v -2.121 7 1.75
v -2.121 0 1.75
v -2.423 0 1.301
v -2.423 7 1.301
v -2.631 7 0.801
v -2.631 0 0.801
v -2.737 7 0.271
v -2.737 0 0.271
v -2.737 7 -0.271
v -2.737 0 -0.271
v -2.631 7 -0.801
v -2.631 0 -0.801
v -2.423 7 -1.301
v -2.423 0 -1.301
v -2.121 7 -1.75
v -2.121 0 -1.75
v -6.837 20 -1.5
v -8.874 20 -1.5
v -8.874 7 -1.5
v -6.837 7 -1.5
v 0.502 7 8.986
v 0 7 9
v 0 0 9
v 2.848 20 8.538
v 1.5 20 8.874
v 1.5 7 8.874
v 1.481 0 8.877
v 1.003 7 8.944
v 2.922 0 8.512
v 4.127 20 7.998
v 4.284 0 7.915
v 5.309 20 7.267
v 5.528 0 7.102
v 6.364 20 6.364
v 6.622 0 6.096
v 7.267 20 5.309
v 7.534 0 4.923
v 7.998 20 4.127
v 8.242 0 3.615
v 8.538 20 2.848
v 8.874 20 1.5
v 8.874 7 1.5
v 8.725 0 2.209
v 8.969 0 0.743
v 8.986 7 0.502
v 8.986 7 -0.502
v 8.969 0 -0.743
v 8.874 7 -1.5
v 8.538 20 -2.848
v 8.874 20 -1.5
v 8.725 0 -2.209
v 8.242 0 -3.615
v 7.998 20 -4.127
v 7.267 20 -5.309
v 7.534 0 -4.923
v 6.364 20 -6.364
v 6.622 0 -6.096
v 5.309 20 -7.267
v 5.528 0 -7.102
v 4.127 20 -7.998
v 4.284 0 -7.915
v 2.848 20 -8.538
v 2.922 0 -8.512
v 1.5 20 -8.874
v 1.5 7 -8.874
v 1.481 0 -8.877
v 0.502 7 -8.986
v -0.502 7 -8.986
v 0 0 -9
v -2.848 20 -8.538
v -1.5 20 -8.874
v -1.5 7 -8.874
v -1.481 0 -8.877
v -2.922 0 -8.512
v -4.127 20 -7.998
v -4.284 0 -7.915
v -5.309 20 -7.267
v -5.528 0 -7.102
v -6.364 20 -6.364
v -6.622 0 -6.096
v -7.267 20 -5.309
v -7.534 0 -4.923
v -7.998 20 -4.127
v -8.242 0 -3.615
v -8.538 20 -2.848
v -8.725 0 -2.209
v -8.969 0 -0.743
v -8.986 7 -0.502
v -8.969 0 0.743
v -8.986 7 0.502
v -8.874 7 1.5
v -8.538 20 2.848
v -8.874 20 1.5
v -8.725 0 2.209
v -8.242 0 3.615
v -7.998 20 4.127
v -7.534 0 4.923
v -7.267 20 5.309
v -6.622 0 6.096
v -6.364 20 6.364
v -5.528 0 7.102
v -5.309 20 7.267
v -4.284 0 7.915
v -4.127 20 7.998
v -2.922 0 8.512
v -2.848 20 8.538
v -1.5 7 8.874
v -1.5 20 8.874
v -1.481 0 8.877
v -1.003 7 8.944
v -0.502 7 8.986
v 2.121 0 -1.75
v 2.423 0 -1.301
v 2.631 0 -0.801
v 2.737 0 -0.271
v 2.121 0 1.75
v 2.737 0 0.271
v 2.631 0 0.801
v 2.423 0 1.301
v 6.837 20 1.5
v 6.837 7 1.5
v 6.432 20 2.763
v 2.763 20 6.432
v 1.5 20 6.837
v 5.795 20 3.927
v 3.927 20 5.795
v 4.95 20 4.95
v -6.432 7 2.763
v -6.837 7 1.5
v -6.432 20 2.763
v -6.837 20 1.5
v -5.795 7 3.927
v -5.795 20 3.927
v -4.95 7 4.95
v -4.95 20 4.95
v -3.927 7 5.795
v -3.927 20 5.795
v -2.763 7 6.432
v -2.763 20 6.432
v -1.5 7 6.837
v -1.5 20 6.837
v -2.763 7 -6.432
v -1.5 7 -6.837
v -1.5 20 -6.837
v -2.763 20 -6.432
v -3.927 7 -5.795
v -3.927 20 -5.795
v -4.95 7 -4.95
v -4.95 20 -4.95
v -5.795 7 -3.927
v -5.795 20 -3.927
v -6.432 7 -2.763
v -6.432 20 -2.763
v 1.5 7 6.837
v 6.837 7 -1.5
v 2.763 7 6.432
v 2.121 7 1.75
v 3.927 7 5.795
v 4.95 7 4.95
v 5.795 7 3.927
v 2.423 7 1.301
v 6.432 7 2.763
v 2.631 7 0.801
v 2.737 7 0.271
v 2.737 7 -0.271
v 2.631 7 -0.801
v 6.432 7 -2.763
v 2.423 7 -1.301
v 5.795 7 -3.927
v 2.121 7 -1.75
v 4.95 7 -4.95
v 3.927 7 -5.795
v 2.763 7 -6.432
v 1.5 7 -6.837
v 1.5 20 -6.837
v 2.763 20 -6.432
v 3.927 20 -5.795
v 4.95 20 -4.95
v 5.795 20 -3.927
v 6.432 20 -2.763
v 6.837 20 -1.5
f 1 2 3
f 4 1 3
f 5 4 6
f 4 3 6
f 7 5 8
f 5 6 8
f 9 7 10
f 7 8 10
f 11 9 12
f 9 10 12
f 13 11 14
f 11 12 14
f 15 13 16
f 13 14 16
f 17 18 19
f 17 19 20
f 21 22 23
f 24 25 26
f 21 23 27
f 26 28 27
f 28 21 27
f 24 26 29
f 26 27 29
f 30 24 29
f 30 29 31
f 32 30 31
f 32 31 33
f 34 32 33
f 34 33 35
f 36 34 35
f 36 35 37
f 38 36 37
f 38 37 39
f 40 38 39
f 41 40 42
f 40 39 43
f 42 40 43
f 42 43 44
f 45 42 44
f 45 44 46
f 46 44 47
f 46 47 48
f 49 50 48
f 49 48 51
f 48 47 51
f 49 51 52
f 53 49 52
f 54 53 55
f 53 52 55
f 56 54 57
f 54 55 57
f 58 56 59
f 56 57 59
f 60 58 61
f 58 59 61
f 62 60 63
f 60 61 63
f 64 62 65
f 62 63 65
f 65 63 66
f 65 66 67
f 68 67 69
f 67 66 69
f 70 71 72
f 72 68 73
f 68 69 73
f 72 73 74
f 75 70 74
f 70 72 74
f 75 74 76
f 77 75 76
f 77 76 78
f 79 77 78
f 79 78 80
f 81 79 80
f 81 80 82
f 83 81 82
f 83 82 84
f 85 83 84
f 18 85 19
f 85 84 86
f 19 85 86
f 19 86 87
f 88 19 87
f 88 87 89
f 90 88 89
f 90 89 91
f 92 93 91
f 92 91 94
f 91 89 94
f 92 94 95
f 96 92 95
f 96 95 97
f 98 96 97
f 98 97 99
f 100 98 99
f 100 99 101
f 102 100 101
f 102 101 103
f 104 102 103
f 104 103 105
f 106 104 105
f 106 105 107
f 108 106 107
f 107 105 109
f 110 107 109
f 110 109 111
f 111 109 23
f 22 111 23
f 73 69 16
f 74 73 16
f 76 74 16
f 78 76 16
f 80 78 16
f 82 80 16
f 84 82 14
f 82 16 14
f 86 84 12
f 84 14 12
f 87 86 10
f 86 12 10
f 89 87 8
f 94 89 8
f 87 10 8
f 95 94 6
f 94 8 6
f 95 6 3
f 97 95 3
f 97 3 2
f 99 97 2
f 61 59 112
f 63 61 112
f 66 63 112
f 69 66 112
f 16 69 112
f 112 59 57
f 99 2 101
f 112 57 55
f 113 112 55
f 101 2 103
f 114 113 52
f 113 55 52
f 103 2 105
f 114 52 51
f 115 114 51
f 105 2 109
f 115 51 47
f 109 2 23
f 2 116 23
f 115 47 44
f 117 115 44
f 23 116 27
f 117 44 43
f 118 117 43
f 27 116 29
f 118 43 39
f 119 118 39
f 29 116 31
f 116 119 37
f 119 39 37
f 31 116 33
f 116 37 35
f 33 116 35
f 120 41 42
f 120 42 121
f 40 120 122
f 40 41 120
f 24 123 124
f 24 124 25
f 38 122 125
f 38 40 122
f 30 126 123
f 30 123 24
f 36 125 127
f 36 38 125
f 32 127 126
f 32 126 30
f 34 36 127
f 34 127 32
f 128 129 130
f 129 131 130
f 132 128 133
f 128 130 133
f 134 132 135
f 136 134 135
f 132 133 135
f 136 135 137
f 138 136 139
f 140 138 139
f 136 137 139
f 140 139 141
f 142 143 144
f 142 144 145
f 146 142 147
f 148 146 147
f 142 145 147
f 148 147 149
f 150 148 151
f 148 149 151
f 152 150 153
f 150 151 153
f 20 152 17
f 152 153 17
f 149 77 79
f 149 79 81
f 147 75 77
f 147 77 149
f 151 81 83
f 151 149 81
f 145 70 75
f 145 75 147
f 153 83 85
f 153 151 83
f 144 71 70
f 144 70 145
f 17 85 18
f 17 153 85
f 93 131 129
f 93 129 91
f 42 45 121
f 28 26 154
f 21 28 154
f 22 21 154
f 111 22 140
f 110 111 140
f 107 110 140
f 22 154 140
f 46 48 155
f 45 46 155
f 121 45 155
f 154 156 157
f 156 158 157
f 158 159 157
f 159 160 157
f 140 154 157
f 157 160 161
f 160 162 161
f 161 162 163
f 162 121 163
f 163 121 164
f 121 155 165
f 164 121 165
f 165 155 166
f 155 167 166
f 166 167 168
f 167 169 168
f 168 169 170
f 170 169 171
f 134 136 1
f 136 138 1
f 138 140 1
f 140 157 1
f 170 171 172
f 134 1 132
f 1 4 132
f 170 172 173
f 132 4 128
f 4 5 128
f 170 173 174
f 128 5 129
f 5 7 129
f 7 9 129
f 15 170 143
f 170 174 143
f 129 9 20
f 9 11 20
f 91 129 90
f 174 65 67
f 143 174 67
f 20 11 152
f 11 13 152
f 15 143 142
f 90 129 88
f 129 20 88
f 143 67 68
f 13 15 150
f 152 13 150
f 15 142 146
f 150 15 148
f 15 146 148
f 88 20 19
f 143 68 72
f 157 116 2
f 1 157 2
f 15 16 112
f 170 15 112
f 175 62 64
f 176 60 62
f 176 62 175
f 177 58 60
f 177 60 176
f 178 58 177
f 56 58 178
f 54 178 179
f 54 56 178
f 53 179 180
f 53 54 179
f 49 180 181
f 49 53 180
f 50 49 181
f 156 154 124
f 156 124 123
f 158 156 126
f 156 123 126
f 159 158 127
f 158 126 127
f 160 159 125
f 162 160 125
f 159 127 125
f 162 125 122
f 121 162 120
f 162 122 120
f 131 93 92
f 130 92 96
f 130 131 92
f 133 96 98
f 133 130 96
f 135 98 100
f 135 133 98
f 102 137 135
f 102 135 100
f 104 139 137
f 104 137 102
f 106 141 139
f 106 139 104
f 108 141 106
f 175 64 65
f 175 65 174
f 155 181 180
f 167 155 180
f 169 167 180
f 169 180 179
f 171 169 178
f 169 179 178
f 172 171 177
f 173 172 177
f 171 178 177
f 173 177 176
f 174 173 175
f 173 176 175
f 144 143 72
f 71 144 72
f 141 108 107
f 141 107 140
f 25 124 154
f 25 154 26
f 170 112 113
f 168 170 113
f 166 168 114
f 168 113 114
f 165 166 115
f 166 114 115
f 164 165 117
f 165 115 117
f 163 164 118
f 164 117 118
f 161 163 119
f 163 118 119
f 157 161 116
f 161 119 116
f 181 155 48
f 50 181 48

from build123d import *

# Parameters (mm, degrees)
SKETCH_1_R          = 9
EXTRUDE_1_DEPTH     = 20
CUT_EXTRUDE_1_DEPTH = 7
SKETCH_3_R          = 7
CUT_EXTRUDE_2_DEPTH = 13
CUT_EXTRUDE_3_DEPTH = 13
CUT_EXTRUDE_4_DEPTH = 13


with BuildPart() as part:
    # 草图1 → 凸台-拉伸1 (new body)
    with BuildSketch(Plane(origin=(0, 0, 0), x_dir=(1, 0, 0), z_dir=(0, 1, 0))):
        with Locations(Location((0, 0, 0), (0, 0, 270))):
            Circle(SKETCH_1_R)
    extrude(amount=EXTRUDE_1_DEPTH)

    # 草图2 → 切除-拉伸1 (cut)
    with BuildSketch(Plane(origin=(0, 0, 0), x_dir=(-1, 0, 0), z_dir=(0, -1, 0))):
        with BuildLine():
            Line((2.121320344, 1.75), (-2.121320344, 1.75))
            ThreePointArc((-2.121320344, 1.75), (-2.75, 0), (-2.121320344, -1.75))
            Line((-2.121320344, -1.75), (2.121320344, -1.75))
            ThreePointArc((2.121320344, -1.75), (2.75, 0), (2.121320344, 1.75))
        make_face()
    extrude(amount=-CUT_EXTRUDE_1_DEPTH, mode=Mode.SUBTRACT)

    # 草图3 → 切除-拉伸2 (cut)
    with BuildSketch(Plane(origin=(0, 20, 0), x_dir=(1, 0, 0), z_dir=(0, 1, 0))):
        with Locations(Location((0, 0, 0), (0, 0, 270))):
            Circle(SKETCH_3_R)
    extrude(amount=-CUT_EXTRUDE_2_DEPTH, mode=Mode.SUBTRACT)

    # 草图8 → 切除-拉伸3 (cut)
    with BuildSketch(Plane(origin=(0, 20, 0), x_dir=(1, 0, 0), z_dir=(0, 1, 0))):
        with BuildLine():
            Line((-1.5, -10.84621088), (-1.5, 10.935737737))
            ThreePointArc((-1.5, 10.935737737), (0, 12.435737737), (1.5, 10.935737737))
            Line((1.5, 10.935737737), (1.5, -10.84621088))
            ThreePointArc((1.5, -10.84621088), (0, -12.34621088), (-1.5, -10.84621088))
        make_face()
    extrude(amount=-CUT_EXTRUDE_3_DEPTH, mode=Mode.SUBTRACT)

    # 草图9 → 切除-拉伸4 (cut)
    with BuildSketch(Plane(origin=(0, 20, 0), x_dir=(1, 0, 0), z_dir=(0, 1, 0))):
        with BuildLine():
            Line((-9.142857143, 1.5), (9.171653543, 1.5))
            ThreePointArc((9.171653543, 1.5), (10.671653543, 0), (9.171653543, -1.5))
            Line((9.171653543, -1.5), (-9.142857143, -1.5))
            ThreePointArc((-9.142857143, -1.5), (-10.642857143, 0), (-9.142857143, 1.5))
        make_face()
    extrude(amount=-CUT_EXTRUDE_4_DEPTH, mode=Mode.SUBTRACT)


solid = part.part
